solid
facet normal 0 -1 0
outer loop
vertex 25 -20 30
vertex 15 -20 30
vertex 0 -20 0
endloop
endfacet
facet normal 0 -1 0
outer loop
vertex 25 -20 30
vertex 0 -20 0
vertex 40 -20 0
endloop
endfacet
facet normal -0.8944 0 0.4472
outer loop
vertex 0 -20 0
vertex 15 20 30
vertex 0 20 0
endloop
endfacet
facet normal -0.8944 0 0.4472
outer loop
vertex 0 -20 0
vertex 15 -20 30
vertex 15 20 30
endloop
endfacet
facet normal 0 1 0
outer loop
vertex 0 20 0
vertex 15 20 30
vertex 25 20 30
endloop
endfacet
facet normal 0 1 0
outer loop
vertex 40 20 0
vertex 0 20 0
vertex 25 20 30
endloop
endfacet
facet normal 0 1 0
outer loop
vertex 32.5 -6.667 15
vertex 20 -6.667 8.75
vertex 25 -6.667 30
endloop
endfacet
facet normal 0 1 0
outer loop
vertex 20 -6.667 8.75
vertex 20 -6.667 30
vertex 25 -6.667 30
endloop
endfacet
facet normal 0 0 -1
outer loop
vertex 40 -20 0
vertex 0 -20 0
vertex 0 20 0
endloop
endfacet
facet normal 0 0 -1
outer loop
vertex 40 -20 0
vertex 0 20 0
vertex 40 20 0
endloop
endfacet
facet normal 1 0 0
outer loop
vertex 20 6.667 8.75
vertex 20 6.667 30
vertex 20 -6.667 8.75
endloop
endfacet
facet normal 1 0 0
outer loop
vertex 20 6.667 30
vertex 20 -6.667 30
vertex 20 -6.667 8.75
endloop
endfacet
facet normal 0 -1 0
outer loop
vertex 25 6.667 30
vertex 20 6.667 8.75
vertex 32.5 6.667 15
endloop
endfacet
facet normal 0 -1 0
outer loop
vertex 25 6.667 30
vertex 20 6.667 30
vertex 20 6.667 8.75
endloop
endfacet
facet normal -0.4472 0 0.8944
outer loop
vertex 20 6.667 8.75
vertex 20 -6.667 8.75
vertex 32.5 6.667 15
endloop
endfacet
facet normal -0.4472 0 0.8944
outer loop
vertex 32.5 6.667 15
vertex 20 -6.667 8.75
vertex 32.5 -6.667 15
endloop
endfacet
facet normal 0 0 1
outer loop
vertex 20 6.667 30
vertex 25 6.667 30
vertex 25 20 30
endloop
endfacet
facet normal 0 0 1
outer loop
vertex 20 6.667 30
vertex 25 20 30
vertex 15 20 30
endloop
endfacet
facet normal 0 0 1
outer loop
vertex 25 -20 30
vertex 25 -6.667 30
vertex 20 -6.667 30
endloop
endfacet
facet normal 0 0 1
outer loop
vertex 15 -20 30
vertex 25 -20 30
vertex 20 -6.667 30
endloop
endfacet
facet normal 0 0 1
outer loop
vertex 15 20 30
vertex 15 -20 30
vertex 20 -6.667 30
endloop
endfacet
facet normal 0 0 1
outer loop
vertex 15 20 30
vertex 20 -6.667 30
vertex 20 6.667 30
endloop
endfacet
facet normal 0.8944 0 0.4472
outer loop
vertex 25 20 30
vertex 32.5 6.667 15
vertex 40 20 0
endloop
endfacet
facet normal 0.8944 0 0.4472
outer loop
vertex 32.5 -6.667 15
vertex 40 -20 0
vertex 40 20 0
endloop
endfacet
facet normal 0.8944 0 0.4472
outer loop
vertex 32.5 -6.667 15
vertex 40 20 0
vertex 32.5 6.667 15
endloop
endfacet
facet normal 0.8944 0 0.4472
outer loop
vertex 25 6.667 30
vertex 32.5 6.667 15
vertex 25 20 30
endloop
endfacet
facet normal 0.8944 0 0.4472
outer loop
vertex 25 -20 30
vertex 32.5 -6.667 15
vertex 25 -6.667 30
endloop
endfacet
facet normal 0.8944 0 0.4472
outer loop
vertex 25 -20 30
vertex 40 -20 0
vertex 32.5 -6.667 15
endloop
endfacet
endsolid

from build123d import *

# Parameters (mm, degrees)
F1_DEPTH = 20
F2_DEPTH = 6.6666666667


# Not quite as in the source:
# - a feature names something its author has since deleted; it is built from what else it names


with BuildPart() as f1:
    # F0 (on Front) → F1 (new body, symmetric)
    with BuildSketch(Plane.XZ):
        Polygon((15, 30), (0, 0), (40, 0), (32.5, 15), (20, 8.75), (20, 30), align=None)
        Polygon((20, 8.75), (32.5, 15), (25, 30), (20, 30), align=None)
    extrude(amount=F1_DEPTH, both=True)

    # F0 (on Front) → F2 (cut, symmetric)
    with BuildSketch(Plane.XZ):
        Polygon((20, 8.75), (32.5, 15), (25, 30), (20, 30), align=None)
    extrude(amount=F2_DEPTH, both=True, mode=Mode.SUBTRACT)


solid = f1.part
